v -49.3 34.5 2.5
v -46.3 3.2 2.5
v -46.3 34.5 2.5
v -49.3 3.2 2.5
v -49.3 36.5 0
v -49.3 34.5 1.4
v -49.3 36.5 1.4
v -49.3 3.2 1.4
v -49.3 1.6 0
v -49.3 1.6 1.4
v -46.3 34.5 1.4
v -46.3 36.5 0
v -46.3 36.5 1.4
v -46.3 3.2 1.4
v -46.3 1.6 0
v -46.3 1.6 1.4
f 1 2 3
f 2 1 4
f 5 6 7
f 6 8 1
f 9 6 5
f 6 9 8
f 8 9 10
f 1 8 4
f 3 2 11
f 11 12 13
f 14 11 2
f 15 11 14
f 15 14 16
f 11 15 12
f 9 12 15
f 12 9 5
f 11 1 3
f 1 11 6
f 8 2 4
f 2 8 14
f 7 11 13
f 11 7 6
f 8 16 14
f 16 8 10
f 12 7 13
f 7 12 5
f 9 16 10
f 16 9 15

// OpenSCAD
// D1 retainer strip: built from model.scad as its own part.
include <model.scad>
view = "retainer";
